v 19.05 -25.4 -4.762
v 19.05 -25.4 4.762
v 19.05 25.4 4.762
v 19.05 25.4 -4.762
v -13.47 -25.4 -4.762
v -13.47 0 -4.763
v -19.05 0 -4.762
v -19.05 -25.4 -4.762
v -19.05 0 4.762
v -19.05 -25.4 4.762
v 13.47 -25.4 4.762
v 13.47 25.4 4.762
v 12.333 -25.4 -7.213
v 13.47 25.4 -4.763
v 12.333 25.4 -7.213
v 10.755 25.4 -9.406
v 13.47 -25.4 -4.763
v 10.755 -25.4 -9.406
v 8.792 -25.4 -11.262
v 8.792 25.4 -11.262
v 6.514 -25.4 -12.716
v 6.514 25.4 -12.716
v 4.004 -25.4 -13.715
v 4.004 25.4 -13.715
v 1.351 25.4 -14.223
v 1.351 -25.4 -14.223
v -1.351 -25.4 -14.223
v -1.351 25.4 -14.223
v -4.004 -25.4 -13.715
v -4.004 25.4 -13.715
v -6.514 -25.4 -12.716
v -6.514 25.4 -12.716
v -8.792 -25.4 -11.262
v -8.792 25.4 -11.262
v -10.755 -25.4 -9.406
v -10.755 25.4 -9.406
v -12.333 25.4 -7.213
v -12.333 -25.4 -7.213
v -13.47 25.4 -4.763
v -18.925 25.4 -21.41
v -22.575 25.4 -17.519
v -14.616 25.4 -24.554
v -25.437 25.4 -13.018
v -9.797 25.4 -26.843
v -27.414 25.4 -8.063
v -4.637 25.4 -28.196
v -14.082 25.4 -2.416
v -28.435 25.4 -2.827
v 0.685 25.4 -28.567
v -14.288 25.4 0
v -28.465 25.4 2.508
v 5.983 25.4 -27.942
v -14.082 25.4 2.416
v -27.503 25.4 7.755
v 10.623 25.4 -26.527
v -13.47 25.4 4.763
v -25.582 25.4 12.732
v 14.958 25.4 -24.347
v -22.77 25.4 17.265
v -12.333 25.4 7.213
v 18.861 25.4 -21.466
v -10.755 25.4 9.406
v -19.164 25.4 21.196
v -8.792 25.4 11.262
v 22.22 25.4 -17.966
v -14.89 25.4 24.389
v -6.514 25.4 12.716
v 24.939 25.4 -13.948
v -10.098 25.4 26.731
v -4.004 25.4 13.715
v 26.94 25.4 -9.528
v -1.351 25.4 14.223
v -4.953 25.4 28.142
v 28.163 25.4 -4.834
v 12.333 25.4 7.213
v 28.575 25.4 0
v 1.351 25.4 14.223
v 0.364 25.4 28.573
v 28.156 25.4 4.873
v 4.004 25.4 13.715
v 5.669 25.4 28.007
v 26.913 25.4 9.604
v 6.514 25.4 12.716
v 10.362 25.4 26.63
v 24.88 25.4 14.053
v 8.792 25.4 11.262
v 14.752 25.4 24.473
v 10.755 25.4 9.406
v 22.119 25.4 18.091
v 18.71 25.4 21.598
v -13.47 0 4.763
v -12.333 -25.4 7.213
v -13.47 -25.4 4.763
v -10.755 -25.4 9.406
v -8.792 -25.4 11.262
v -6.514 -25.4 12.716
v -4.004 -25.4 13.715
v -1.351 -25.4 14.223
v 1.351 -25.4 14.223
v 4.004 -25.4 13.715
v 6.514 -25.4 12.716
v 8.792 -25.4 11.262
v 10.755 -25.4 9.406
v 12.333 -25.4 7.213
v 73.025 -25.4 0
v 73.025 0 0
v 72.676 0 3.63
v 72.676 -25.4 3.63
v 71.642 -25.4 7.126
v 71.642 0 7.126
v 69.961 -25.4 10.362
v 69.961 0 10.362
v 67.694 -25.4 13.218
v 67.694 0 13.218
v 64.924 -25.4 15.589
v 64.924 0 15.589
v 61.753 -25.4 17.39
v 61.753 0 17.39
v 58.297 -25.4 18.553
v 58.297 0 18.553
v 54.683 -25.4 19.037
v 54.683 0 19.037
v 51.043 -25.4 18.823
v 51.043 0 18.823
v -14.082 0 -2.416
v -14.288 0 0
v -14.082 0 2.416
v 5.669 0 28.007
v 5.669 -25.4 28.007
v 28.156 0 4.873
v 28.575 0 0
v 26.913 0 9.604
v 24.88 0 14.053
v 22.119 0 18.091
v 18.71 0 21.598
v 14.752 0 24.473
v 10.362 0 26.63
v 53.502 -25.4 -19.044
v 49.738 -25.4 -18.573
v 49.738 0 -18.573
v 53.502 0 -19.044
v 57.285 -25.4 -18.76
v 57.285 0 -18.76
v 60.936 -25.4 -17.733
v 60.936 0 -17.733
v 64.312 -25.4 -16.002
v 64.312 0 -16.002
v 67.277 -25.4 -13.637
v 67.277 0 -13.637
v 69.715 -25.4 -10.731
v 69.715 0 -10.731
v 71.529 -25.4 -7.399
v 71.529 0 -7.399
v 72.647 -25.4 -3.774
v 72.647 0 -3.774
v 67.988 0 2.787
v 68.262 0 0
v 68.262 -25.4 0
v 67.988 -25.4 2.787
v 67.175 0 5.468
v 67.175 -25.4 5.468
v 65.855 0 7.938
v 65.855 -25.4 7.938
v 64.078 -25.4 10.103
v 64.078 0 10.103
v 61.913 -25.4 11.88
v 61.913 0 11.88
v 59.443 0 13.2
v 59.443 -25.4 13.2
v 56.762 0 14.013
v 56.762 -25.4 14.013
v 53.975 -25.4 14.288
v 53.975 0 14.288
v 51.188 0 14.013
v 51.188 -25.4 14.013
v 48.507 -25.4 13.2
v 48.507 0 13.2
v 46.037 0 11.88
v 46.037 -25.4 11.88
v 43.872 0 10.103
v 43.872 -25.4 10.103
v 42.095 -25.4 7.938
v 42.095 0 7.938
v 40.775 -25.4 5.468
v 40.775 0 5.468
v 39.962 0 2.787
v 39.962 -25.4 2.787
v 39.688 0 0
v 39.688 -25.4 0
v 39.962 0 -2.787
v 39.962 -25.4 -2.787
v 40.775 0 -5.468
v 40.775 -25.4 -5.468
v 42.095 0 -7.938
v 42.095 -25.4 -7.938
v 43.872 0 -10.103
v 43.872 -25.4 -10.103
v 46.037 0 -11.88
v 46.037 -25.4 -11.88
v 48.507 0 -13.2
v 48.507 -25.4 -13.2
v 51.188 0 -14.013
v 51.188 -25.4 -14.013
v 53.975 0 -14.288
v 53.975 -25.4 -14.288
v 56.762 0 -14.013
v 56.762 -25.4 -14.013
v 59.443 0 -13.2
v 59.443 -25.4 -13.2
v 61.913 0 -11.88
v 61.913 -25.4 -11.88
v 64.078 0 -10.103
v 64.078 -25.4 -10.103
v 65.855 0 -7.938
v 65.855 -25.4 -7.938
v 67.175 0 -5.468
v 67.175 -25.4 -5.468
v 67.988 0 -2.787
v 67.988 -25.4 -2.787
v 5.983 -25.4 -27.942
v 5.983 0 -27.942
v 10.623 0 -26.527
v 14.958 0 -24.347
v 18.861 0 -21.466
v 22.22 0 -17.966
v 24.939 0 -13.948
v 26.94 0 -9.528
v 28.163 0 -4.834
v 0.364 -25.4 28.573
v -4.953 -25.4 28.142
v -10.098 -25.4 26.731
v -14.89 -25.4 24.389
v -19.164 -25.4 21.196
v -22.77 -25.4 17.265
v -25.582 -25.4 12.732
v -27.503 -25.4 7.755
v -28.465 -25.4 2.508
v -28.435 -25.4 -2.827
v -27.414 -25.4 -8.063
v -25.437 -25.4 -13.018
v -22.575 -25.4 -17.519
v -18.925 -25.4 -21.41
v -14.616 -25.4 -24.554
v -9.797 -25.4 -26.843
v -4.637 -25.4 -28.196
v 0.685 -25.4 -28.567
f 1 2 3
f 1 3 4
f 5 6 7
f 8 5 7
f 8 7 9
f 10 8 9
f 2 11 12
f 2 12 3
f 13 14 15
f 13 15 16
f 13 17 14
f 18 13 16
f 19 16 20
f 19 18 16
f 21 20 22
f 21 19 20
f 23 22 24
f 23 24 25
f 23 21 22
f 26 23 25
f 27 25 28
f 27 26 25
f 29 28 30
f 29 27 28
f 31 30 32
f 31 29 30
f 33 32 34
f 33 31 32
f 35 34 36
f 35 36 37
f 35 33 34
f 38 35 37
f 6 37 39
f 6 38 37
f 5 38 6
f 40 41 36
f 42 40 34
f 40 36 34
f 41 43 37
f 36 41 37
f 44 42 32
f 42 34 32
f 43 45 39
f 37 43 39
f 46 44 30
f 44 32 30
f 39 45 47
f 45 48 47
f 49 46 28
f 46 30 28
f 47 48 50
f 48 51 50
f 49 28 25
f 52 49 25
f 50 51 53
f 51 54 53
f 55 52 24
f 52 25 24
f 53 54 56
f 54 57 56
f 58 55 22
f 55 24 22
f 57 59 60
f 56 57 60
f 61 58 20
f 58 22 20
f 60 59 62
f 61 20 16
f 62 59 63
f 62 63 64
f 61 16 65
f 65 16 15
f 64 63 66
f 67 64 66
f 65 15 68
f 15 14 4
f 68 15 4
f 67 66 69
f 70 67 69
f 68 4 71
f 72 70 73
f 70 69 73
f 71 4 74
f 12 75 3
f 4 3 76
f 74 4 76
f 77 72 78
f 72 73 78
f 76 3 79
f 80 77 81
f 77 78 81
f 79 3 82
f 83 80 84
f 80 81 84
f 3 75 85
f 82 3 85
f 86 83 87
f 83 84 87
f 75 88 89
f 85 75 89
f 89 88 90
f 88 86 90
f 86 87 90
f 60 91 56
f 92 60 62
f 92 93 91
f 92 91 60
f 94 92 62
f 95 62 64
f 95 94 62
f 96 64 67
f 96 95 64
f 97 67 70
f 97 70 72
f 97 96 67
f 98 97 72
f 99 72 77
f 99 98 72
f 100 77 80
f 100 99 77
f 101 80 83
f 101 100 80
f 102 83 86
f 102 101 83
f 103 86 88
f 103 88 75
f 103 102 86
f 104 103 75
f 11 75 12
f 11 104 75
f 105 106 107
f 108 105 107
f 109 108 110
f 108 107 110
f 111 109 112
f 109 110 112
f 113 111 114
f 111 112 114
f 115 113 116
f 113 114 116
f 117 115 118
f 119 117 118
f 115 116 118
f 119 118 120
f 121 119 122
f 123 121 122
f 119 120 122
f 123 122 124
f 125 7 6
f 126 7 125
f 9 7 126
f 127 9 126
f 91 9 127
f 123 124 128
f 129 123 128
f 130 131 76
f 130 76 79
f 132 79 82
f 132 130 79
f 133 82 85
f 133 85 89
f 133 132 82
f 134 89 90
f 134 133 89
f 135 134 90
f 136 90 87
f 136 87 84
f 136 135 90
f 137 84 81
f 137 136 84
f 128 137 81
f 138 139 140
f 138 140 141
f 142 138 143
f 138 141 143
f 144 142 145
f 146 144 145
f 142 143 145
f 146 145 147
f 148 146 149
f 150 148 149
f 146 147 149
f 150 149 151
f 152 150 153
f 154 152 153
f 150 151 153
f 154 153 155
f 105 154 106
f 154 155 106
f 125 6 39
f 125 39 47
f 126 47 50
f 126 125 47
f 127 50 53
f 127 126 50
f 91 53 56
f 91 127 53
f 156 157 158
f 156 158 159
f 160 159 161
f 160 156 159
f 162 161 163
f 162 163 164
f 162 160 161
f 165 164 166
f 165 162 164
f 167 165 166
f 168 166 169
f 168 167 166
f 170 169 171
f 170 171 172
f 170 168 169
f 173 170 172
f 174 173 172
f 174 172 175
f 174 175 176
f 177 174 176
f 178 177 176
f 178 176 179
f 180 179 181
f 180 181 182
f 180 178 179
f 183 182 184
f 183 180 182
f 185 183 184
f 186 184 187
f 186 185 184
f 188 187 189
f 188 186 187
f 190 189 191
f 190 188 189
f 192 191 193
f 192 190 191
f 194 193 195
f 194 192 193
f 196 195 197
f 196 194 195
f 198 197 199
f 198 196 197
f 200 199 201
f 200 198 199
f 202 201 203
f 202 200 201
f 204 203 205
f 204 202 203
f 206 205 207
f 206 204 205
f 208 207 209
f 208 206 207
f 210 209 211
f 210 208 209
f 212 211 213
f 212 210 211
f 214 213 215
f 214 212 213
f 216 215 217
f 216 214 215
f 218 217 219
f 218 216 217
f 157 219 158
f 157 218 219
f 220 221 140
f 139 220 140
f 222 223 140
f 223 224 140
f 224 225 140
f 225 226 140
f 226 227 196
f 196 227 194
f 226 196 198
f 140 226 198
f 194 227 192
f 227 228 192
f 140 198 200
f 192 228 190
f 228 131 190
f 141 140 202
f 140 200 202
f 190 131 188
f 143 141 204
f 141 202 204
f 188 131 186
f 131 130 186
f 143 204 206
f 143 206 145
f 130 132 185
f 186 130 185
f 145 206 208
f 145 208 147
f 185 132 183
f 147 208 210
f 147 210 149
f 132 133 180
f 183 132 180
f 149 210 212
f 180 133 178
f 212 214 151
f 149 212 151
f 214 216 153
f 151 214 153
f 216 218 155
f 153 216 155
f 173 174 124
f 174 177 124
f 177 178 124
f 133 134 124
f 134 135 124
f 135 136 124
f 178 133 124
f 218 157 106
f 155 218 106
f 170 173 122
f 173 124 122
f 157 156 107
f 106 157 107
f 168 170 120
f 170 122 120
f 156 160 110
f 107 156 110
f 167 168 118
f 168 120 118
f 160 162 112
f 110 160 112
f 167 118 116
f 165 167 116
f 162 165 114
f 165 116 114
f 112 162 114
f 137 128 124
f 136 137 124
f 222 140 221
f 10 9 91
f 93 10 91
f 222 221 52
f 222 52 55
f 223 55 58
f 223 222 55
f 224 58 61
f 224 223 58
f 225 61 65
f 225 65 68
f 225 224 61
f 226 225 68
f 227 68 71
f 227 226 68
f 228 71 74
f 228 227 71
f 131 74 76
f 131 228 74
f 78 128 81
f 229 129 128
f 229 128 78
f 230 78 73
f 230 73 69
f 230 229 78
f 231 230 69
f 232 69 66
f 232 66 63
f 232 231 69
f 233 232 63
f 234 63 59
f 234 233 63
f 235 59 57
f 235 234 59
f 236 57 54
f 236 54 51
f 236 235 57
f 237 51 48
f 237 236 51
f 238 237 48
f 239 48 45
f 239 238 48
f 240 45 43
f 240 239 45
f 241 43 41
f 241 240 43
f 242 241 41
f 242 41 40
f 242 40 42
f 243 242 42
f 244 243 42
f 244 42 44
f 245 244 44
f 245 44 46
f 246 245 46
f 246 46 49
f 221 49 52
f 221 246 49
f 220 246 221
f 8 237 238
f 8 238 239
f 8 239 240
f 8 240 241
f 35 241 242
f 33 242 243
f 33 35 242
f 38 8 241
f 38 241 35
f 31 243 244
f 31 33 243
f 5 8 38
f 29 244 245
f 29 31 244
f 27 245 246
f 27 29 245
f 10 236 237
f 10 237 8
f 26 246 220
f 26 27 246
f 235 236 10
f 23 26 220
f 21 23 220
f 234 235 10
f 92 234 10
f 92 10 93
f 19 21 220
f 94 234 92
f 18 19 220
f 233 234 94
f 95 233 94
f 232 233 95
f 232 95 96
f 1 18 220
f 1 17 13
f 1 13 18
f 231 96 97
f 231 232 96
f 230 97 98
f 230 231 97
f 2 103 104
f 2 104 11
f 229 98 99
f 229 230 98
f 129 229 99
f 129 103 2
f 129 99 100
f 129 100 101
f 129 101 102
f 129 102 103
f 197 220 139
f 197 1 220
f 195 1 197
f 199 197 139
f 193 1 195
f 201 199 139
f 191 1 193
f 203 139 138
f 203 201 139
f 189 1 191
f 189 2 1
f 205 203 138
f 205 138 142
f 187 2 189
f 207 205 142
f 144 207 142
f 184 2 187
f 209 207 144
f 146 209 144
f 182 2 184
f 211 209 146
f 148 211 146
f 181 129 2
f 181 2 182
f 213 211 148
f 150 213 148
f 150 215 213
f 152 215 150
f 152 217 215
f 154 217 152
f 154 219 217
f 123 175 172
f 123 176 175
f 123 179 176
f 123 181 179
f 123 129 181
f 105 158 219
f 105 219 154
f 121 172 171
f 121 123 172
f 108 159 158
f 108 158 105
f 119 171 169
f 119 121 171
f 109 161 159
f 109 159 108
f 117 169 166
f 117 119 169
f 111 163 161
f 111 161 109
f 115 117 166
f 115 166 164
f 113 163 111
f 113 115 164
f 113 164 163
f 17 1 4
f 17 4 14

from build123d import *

# Parameters (mm, degrees)
F0_R     = 14.2875
F1_DEPTH = 25.4
F2_DEPTH = 25.4


with BuildPart() as f1:
    # F0 (on Front) → F1 (new body)
    with BuildSketch(Plane.XZ):
        with BuildLine():
            ThreePointArc((5.9827839062, -27.9416699882), (22.2203586281, -17.9662541294), (28.575, 0))
            ThreePointArc((28.575, 0), (22.1191753976, 18.0906800516), (5.6687739472, 28.0070638757))
            ThreePointArc((5.6687739472, 28.0070638757), (-28.5745499588, -0.160373482), (5.9827839062, -27.9416699882))
        make_face()
        with BuildLine():
            ThreePointArc((-13.4703841816, 4.7625), (0, 14.2875), (13.4703841816, 4.7625))
            Line((13.4703841816, 4.7625), (19.05, 4.7625))
            Line((19.05, 4.7625), (19.05, -4.7625))
            Line((19.05, -4.7625), (13.4703841816, -4.7625))
            ThreePointArc((13.4703841816, -4.7625), (0, -14.2875), (-13.4703841816, -4.7625))
            Line((-13.4703841816, -4.7625), (-19.05, -4.7625))
            Line((-19.05, -4.7625), (-19.05, 4.7625))
            Line((-19.05, 4.7625), (-13.4703841816, 4.7625))
        make_face(mode=Mode.SUBTRACT)
        with BuildLine():
            ThreePointArc((5.6687739472, 28.0070638757), (22.1191753976, 18.0906800516), (28.575, 0))
            ThreePointArc((28.575, 0), (22.2203586281, -17.9662541294), (5.9827839062, -27.9416699882))
            Line((5.9827839062, -27.9416699882), (49.7382261223, -18.5728901119))
            ThreePointArc((49.7382261223, -18.5728901119), (34.9365884326, 0.6643681139), (51.0432019838, 18.8230459913))
            Line((51.0432019838, 18.8230459913), (5.6687739472, 28.0070638757))
        make_face()
        with BuildLine():
            ThreePointArc((73.025, 0), (66.3655558348, 14.469852318), (51.0432019838, 18.8230459913))
            ThreePointArc((51.0432019838, 18.8230459913), (34.9365884326, 0.6643681139), (49.7382261223, -18.5728901119))
            ThreePointArc((49.7382261223, -18.5728901119), (65.8533828367, -14.8931702866), (73.025, 0))
        make_face()
        with Locations((53.975, 0)):
            Circle(F0_R, mode=Mode.SUBTRACT)
    extrude(amount=F1_DEPTH)

    # F0 (on Front) → F2 (join)
    with BuildSketch(Plane.XZ):
        with BuildLine():
            ThreePointArc((5.9827839062, -27.9416699882), (22.2203586281, -17.9662541294), (28.575, 0))
            ThreePointArc((28.575, 0), (22.1191753976, 18.0906800516), (5.6687739472, 28.0070638757))
            ThreePointArc((5.6687739472, 28.0070638757), (-28.5745499588, -0.160373482), (5.9827839062, -27.9416699882))
        make_face()
        with BuildLine():
            ThreePointArc((-13.4703841816, 4.7625), (0, 14.2875), (13.4703841816, 4.7625))
            Line((13.4703841816, 4.7625), (19.05, 4.7625))
            Line((19.05, 4.7625), (19.05, -4.7625))
            Line((19.05, -4.7625), (13.4703841816, -4.7625))
            ThreePointArc((13.4703841816, -4.7625), (0, -14.2875), (-13.4703841816, -4.7625))
            Line((-13.4703841816, -4.7625), (-19.05, -4.7625))
            Line((-19.05, -4.7625), (-19.05, 4.7625))
            Line((-19.05, 4.7625), (-13.4703841816, 4.7625))
        make_face(mode=Mode.SUBTRACT)
        with BuildLine():
            ThreePointArc((-13.4703841816, -4.7625), (-14.2875, 0), (-13.4703841816, 4.7625))
            Line((-13.4703841816, 4.7625), (-19.05, 4.7625))
            Line((-19.05, 4.7625), (-19.05, -4.7625))
            Line((-19.05, -4.7625), (-13.4703841816, -4.7625))
        make_face()
    extrude(amount=-F2_DEPTH)


solid = f1.part
